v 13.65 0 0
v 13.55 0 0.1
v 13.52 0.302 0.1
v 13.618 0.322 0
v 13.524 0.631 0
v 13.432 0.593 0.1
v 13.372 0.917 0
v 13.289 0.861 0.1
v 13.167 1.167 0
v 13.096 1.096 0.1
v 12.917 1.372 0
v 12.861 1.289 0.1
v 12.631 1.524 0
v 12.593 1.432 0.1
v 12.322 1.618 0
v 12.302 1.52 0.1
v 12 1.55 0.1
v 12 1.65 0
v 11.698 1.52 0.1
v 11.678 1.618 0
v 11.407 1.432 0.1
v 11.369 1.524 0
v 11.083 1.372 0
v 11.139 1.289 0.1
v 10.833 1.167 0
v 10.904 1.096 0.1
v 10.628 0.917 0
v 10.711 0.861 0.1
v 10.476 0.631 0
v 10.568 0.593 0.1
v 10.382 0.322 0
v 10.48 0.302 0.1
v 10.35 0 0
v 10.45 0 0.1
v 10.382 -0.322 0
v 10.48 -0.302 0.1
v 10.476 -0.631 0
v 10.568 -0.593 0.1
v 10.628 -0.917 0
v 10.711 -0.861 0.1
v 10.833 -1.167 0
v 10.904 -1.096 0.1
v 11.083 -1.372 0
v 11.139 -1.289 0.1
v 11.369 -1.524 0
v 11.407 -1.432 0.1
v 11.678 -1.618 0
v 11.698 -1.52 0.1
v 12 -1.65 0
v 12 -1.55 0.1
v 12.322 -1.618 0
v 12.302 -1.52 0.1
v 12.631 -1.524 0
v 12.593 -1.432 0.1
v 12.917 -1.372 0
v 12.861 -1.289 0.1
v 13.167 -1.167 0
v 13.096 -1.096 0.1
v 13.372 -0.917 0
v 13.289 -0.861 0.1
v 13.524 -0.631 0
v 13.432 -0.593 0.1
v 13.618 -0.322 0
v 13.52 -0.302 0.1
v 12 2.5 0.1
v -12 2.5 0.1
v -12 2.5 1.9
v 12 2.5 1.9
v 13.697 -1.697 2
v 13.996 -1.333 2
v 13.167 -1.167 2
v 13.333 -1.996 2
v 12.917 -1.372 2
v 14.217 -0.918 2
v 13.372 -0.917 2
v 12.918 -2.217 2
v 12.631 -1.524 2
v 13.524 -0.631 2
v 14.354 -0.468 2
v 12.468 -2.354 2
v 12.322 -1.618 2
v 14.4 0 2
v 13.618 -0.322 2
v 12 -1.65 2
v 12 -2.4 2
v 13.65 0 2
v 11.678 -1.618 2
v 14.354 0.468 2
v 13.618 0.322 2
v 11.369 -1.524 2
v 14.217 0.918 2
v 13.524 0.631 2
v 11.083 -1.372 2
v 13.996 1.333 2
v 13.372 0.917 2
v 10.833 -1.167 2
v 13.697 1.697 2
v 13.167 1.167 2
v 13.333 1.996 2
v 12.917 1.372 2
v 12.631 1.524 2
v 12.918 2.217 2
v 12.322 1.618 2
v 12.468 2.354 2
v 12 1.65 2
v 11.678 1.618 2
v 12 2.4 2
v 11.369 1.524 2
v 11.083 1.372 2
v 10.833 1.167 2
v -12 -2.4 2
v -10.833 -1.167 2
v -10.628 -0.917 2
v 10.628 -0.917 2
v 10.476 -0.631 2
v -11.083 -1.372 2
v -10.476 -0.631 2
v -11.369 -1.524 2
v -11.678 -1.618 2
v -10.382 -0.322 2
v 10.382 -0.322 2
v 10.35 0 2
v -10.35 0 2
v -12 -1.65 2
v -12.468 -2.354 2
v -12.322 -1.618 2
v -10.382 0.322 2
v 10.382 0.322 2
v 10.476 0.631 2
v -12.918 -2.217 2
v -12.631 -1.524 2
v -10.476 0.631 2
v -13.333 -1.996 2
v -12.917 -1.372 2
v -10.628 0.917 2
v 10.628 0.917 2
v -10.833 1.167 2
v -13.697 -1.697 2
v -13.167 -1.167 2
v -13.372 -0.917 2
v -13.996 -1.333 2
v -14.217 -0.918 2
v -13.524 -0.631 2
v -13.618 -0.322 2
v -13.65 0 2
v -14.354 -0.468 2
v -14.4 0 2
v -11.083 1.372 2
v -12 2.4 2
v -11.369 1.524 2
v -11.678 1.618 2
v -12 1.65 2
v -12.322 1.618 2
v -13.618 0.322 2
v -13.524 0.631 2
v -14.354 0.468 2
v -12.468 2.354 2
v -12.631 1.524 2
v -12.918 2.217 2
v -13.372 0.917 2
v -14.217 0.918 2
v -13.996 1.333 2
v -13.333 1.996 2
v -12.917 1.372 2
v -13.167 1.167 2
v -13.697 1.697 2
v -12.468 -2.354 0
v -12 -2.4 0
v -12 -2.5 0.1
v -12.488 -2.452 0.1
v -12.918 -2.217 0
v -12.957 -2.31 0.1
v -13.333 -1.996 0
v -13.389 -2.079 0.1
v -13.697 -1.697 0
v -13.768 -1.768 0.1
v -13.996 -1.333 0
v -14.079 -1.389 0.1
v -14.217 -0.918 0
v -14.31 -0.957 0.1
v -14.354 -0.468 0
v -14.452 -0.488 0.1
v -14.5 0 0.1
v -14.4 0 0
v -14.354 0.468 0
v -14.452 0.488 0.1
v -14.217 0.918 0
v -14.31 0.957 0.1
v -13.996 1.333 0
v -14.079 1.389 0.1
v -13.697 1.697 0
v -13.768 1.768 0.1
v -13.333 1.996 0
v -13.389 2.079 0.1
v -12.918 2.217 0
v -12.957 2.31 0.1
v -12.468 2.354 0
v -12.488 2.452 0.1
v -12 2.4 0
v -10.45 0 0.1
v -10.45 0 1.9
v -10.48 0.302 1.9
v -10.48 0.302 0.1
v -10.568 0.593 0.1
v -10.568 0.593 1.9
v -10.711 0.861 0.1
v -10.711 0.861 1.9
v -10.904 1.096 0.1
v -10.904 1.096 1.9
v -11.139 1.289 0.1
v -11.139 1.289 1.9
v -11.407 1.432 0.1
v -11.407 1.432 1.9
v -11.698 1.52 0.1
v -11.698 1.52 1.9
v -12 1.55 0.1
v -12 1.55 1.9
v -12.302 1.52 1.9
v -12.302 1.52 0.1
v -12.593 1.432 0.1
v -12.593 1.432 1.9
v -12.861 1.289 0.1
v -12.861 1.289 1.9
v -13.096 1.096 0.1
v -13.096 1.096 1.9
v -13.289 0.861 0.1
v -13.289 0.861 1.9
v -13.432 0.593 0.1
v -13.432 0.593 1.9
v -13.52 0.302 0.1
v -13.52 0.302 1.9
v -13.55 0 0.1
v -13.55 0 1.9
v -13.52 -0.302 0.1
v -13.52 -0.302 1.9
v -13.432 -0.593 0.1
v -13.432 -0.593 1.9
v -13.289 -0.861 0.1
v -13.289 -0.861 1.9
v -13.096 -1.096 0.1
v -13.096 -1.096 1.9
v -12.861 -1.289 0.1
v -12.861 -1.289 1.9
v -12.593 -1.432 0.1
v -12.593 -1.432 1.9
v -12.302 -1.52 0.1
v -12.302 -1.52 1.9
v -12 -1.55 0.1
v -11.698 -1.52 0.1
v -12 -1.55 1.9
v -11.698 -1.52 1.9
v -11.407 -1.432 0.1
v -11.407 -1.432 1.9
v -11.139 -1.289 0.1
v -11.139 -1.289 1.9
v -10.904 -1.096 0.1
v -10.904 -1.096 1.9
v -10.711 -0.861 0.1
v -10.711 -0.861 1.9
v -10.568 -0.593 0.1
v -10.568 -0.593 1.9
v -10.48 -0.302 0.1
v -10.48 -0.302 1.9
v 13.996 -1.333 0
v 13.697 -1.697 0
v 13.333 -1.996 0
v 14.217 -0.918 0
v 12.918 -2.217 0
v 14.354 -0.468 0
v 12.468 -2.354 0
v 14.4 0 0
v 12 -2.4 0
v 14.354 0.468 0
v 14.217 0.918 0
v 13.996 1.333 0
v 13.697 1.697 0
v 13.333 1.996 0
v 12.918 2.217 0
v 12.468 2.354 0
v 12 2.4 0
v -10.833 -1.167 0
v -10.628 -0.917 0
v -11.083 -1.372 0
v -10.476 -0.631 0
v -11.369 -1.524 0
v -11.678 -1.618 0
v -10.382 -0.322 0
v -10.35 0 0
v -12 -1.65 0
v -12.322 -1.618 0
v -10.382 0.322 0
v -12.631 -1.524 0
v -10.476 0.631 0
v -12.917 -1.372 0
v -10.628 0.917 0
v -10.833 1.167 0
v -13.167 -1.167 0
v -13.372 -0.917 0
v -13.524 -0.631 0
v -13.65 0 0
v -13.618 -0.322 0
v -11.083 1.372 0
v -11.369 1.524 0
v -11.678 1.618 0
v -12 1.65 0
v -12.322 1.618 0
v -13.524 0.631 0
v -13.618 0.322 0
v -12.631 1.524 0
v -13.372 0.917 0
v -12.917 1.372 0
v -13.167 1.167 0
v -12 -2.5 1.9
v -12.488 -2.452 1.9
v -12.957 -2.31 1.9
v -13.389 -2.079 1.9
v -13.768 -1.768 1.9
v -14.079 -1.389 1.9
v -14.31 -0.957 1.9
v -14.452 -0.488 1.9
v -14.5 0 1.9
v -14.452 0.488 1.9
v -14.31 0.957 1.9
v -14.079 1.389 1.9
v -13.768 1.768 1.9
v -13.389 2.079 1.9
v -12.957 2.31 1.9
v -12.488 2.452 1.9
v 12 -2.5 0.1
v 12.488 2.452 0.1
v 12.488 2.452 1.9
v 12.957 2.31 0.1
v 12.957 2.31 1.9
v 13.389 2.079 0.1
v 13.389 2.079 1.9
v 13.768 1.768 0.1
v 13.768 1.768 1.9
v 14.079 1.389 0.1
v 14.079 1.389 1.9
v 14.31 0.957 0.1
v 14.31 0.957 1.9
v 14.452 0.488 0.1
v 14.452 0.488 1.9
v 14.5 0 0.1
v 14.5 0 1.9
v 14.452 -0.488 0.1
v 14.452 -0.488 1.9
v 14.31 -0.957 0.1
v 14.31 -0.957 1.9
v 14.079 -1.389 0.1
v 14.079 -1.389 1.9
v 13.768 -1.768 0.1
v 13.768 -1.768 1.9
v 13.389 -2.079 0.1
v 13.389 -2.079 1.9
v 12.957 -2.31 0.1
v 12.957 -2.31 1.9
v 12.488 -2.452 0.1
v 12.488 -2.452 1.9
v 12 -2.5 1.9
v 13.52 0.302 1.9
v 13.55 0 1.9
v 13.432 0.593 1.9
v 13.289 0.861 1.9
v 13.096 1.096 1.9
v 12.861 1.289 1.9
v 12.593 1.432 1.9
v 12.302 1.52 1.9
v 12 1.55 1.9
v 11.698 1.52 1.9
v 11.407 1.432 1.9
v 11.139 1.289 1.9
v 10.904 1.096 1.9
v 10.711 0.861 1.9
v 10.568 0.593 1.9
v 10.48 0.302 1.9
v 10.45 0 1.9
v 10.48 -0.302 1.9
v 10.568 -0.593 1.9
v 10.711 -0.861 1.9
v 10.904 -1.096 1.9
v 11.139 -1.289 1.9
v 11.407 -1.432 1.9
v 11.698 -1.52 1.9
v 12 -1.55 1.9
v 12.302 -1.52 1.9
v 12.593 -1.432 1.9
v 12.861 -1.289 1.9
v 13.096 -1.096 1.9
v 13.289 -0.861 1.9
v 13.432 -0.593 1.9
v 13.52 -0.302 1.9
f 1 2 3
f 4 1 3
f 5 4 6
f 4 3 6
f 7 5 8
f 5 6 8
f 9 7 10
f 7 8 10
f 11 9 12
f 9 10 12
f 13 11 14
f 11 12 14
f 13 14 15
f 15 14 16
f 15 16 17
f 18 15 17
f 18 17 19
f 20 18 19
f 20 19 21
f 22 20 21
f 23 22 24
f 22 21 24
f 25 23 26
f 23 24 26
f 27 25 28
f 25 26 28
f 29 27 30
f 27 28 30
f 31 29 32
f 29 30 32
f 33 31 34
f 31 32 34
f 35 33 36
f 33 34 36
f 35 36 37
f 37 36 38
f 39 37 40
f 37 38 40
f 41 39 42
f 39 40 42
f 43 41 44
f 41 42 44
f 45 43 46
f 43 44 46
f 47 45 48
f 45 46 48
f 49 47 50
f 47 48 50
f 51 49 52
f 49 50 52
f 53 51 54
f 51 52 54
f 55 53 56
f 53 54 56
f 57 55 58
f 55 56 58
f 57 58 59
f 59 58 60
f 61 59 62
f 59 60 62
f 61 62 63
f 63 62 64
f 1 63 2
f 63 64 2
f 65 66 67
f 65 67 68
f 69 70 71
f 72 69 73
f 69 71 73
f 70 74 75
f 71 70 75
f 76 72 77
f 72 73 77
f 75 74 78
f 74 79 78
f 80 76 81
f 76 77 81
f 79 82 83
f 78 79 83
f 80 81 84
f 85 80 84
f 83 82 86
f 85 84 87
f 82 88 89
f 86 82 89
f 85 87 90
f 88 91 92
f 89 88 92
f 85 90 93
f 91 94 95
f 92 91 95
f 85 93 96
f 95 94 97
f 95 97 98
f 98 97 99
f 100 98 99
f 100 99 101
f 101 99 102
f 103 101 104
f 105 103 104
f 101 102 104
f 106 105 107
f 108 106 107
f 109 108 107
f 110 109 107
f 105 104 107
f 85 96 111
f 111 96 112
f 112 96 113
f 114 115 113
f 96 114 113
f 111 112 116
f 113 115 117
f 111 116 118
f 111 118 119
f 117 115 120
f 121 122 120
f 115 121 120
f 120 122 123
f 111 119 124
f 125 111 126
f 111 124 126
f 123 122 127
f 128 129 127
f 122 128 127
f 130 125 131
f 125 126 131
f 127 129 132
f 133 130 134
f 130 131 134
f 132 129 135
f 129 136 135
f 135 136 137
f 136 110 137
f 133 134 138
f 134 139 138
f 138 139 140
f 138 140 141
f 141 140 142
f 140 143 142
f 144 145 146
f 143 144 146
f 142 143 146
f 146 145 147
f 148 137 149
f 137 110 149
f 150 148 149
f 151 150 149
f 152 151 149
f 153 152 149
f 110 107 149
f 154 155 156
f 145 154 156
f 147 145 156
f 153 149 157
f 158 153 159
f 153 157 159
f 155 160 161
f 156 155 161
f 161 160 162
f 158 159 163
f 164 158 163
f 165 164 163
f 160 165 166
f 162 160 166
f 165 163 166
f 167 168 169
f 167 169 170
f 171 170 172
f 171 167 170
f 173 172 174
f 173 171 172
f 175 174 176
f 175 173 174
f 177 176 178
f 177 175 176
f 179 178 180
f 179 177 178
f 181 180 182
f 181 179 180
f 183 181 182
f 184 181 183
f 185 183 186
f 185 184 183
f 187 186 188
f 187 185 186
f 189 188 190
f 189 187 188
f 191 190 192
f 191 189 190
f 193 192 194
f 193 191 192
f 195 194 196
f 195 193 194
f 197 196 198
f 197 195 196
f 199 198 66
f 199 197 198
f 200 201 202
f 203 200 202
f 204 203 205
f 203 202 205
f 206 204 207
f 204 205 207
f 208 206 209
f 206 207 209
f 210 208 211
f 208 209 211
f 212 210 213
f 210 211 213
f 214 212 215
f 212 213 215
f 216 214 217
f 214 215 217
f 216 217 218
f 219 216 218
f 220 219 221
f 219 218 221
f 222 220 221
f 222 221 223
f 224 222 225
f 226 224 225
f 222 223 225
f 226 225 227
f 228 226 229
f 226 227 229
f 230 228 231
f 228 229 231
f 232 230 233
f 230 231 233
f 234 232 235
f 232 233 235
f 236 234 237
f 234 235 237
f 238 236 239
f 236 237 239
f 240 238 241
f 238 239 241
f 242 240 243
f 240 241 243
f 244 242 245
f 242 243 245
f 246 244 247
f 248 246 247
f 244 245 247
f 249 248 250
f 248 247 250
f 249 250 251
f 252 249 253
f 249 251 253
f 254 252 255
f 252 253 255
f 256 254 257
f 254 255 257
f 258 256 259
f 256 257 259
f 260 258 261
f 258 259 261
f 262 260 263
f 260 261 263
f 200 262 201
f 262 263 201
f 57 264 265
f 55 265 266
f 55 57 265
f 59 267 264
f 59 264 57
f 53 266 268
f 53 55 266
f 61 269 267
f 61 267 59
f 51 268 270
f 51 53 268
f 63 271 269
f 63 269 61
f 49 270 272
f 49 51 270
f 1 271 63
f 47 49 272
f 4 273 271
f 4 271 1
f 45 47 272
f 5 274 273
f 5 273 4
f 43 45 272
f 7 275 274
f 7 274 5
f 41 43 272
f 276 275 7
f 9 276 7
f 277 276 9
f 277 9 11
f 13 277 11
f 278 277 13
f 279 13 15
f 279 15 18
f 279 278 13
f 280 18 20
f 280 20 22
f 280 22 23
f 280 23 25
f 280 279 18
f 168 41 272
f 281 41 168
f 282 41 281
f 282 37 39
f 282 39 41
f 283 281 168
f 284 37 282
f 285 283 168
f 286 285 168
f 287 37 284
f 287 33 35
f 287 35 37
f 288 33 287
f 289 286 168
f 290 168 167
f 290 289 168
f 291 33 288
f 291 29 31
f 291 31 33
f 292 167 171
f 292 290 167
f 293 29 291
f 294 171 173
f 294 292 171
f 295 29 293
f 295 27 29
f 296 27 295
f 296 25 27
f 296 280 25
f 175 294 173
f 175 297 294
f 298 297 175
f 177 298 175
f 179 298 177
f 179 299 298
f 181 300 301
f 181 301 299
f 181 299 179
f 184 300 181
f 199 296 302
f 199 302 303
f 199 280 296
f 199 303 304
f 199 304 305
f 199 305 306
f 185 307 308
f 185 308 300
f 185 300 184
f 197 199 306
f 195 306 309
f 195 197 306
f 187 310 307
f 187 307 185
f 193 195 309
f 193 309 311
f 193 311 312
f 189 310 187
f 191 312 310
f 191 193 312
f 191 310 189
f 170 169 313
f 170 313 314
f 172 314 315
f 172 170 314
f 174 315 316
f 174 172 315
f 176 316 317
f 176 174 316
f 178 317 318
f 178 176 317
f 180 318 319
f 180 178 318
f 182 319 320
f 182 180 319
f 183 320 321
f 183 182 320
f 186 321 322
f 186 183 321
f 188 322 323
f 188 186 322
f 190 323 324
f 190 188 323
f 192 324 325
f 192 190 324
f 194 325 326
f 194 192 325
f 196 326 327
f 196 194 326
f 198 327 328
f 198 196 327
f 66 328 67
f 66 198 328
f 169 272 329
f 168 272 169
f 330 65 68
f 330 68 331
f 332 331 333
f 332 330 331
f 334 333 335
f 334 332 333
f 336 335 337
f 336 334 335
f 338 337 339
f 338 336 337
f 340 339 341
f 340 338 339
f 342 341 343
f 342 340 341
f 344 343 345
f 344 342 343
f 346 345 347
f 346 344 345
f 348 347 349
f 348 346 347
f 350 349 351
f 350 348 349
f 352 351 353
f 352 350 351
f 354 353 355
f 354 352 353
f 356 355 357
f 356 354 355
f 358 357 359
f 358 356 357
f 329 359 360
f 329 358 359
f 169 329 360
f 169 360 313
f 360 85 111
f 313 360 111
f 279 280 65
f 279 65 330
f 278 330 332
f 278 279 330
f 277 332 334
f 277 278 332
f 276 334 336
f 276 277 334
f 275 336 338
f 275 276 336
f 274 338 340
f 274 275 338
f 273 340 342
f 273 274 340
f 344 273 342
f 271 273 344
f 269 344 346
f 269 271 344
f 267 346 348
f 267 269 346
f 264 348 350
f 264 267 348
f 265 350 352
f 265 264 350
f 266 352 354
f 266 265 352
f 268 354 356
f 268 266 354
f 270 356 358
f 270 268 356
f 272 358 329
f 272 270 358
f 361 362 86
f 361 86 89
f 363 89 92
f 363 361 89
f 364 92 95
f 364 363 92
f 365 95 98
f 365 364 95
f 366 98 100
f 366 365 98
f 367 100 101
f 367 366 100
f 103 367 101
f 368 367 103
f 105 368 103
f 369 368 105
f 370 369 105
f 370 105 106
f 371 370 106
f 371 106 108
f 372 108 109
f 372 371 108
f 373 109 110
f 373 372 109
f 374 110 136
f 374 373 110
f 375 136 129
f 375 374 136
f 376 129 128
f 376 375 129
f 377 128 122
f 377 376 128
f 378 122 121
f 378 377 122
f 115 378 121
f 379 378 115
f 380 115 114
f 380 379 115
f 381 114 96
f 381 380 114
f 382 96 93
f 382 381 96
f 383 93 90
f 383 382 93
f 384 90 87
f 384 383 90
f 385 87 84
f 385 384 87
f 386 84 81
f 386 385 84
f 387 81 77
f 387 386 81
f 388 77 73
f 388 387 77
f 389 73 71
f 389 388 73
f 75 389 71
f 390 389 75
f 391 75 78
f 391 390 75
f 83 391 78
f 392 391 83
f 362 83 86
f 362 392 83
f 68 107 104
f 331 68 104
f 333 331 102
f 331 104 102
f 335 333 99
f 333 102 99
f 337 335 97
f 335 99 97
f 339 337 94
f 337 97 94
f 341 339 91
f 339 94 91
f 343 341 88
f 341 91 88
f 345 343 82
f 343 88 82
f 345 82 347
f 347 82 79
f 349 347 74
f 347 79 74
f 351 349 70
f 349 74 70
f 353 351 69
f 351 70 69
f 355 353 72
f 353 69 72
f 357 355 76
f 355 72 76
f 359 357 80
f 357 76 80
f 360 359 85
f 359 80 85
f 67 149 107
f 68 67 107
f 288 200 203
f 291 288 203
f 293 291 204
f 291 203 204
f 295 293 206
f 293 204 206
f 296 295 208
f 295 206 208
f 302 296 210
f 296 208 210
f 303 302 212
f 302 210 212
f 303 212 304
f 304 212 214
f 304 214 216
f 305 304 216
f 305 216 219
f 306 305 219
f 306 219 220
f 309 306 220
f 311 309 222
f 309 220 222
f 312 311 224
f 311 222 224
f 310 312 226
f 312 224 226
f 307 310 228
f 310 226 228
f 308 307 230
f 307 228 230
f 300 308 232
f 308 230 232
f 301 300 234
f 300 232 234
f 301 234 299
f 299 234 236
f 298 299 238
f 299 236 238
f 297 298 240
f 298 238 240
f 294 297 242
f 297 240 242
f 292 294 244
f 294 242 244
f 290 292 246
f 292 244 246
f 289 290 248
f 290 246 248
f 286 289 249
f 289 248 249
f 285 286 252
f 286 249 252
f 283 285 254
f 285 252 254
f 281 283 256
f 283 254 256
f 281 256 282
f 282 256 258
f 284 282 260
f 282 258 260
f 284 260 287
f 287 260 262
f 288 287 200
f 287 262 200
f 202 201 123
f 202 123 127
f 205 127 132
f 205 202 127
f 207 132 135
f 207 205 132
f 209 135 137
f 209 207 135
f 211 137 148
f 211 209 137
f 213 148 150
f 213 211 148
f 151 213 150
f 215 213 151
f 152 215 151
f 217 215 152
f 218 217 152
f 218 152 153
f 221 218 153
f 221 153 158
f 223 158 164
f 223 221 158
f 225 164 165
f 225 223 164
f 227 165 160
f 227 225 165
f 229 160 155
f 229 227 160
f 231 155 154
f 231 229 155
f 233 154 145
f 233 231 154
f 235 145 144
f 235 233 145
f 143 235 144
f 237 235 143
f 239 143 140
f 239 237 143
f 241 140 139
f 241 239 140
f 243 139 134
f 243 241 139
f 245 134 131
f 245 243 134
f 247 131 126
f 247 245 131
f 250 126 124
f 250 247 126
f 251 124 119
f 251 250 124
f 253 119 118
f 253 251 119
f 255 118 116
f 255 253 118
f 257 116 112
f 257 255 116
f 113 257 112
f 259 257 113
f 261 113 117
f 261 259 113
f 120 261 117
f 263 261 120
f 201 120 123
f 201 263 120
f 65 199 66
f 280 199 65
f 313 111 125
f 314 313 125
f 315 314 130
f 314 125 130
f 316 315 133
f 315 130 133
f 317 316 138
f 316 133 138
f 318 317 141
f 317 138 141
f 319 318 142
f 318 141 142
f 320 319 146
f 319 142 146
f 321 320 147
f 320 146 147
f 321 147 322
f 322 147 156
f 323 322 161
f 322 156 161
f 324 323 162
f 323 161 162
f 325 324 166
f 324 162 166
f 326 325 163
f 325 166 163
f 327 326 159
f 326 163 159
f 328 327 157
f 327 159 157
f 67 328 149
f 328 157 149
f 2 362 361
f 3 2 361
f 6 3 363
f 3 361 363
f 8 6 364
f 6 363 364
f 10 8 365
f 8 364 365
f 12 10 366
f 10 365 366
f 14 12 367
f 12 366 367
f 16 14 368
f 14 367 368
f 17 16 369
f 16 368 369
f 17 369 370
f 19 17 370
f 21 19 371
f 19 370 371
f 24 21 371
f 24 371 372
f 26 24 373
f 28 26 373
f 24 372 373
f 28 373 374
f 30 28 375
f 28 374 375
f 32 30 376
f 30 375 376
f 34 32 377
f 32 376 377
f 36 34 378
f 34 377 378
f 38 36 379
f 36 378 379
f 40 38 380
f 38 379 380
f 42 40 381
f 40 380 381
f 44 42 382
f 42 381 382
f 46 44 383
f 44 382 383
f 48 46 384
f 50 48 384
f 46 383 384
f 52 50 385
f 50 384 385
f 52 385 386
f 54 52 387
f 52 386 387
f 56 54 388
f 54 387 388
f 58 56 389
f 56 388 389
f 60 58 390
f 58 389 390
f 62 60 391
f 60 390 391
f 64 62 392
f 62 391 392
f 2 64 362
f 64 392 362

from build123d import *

# Parameters (mm, degrees)
BOSS_EXTRUDE1_DEPTH = 2
SKETCH2_R           = 1.55
CUT_EXTRUDE1_DEPTH  = 2
CHAMFER1_SIZE       = 0.1


with BuildPart() as part:
    # Sketch1 → Boss-Extrude1 (new body)
    with BuildSketch(Plane.XY):
        with BuildLine():
            Line((-12, 2.5), (12, 2.5))
            ThreePointArc((12, 2.5), (14.5, 0), (12, -2.5))
            Line((12, -2.5), (-12, -2.5))
            ThreePointArc((-12, -2.5), (-14.5, 0), (-12, 2.5))
        make_face()
    extrude(amount=BOSS_EXTRUDE1_DEPTH)

    # Sketch2 → Cut-Extrude1 (cut)
    with BuildSketch(Plane.XY.offset(2)):
        with Locations((-12, 0)):
            Circle(SKETCH2_R)
        with Locations((12, 0)):
            Circle(SKETCH2_R)
    extrude(amount=-CUT_EXTRUDE1_DEPTH, mode=Mode.SUBTRACT)

    # Chamfer1
    chamfer1_edges = [part.edges().sort_by_distance(p)[0] for p in [
        (14.5, 0, 2),
        (0, 2.5, 2),
        (-13.55, 0, 0),
        (-13.55, 0, 2),
        (10.45, 0, 0),
        (10.45, 0, 2),
        (-14.5, 0, 2),
        (0, 2.5, 0),
        (14.5, 0, 0),
        (0, -2.5, 0),
        (-14.5, 0, 0),
        (0, -2.5, 2),
    ]]
    chamfer(chamfer1_edges, length=CHAMFER1_SIZE)


solid = part.part
